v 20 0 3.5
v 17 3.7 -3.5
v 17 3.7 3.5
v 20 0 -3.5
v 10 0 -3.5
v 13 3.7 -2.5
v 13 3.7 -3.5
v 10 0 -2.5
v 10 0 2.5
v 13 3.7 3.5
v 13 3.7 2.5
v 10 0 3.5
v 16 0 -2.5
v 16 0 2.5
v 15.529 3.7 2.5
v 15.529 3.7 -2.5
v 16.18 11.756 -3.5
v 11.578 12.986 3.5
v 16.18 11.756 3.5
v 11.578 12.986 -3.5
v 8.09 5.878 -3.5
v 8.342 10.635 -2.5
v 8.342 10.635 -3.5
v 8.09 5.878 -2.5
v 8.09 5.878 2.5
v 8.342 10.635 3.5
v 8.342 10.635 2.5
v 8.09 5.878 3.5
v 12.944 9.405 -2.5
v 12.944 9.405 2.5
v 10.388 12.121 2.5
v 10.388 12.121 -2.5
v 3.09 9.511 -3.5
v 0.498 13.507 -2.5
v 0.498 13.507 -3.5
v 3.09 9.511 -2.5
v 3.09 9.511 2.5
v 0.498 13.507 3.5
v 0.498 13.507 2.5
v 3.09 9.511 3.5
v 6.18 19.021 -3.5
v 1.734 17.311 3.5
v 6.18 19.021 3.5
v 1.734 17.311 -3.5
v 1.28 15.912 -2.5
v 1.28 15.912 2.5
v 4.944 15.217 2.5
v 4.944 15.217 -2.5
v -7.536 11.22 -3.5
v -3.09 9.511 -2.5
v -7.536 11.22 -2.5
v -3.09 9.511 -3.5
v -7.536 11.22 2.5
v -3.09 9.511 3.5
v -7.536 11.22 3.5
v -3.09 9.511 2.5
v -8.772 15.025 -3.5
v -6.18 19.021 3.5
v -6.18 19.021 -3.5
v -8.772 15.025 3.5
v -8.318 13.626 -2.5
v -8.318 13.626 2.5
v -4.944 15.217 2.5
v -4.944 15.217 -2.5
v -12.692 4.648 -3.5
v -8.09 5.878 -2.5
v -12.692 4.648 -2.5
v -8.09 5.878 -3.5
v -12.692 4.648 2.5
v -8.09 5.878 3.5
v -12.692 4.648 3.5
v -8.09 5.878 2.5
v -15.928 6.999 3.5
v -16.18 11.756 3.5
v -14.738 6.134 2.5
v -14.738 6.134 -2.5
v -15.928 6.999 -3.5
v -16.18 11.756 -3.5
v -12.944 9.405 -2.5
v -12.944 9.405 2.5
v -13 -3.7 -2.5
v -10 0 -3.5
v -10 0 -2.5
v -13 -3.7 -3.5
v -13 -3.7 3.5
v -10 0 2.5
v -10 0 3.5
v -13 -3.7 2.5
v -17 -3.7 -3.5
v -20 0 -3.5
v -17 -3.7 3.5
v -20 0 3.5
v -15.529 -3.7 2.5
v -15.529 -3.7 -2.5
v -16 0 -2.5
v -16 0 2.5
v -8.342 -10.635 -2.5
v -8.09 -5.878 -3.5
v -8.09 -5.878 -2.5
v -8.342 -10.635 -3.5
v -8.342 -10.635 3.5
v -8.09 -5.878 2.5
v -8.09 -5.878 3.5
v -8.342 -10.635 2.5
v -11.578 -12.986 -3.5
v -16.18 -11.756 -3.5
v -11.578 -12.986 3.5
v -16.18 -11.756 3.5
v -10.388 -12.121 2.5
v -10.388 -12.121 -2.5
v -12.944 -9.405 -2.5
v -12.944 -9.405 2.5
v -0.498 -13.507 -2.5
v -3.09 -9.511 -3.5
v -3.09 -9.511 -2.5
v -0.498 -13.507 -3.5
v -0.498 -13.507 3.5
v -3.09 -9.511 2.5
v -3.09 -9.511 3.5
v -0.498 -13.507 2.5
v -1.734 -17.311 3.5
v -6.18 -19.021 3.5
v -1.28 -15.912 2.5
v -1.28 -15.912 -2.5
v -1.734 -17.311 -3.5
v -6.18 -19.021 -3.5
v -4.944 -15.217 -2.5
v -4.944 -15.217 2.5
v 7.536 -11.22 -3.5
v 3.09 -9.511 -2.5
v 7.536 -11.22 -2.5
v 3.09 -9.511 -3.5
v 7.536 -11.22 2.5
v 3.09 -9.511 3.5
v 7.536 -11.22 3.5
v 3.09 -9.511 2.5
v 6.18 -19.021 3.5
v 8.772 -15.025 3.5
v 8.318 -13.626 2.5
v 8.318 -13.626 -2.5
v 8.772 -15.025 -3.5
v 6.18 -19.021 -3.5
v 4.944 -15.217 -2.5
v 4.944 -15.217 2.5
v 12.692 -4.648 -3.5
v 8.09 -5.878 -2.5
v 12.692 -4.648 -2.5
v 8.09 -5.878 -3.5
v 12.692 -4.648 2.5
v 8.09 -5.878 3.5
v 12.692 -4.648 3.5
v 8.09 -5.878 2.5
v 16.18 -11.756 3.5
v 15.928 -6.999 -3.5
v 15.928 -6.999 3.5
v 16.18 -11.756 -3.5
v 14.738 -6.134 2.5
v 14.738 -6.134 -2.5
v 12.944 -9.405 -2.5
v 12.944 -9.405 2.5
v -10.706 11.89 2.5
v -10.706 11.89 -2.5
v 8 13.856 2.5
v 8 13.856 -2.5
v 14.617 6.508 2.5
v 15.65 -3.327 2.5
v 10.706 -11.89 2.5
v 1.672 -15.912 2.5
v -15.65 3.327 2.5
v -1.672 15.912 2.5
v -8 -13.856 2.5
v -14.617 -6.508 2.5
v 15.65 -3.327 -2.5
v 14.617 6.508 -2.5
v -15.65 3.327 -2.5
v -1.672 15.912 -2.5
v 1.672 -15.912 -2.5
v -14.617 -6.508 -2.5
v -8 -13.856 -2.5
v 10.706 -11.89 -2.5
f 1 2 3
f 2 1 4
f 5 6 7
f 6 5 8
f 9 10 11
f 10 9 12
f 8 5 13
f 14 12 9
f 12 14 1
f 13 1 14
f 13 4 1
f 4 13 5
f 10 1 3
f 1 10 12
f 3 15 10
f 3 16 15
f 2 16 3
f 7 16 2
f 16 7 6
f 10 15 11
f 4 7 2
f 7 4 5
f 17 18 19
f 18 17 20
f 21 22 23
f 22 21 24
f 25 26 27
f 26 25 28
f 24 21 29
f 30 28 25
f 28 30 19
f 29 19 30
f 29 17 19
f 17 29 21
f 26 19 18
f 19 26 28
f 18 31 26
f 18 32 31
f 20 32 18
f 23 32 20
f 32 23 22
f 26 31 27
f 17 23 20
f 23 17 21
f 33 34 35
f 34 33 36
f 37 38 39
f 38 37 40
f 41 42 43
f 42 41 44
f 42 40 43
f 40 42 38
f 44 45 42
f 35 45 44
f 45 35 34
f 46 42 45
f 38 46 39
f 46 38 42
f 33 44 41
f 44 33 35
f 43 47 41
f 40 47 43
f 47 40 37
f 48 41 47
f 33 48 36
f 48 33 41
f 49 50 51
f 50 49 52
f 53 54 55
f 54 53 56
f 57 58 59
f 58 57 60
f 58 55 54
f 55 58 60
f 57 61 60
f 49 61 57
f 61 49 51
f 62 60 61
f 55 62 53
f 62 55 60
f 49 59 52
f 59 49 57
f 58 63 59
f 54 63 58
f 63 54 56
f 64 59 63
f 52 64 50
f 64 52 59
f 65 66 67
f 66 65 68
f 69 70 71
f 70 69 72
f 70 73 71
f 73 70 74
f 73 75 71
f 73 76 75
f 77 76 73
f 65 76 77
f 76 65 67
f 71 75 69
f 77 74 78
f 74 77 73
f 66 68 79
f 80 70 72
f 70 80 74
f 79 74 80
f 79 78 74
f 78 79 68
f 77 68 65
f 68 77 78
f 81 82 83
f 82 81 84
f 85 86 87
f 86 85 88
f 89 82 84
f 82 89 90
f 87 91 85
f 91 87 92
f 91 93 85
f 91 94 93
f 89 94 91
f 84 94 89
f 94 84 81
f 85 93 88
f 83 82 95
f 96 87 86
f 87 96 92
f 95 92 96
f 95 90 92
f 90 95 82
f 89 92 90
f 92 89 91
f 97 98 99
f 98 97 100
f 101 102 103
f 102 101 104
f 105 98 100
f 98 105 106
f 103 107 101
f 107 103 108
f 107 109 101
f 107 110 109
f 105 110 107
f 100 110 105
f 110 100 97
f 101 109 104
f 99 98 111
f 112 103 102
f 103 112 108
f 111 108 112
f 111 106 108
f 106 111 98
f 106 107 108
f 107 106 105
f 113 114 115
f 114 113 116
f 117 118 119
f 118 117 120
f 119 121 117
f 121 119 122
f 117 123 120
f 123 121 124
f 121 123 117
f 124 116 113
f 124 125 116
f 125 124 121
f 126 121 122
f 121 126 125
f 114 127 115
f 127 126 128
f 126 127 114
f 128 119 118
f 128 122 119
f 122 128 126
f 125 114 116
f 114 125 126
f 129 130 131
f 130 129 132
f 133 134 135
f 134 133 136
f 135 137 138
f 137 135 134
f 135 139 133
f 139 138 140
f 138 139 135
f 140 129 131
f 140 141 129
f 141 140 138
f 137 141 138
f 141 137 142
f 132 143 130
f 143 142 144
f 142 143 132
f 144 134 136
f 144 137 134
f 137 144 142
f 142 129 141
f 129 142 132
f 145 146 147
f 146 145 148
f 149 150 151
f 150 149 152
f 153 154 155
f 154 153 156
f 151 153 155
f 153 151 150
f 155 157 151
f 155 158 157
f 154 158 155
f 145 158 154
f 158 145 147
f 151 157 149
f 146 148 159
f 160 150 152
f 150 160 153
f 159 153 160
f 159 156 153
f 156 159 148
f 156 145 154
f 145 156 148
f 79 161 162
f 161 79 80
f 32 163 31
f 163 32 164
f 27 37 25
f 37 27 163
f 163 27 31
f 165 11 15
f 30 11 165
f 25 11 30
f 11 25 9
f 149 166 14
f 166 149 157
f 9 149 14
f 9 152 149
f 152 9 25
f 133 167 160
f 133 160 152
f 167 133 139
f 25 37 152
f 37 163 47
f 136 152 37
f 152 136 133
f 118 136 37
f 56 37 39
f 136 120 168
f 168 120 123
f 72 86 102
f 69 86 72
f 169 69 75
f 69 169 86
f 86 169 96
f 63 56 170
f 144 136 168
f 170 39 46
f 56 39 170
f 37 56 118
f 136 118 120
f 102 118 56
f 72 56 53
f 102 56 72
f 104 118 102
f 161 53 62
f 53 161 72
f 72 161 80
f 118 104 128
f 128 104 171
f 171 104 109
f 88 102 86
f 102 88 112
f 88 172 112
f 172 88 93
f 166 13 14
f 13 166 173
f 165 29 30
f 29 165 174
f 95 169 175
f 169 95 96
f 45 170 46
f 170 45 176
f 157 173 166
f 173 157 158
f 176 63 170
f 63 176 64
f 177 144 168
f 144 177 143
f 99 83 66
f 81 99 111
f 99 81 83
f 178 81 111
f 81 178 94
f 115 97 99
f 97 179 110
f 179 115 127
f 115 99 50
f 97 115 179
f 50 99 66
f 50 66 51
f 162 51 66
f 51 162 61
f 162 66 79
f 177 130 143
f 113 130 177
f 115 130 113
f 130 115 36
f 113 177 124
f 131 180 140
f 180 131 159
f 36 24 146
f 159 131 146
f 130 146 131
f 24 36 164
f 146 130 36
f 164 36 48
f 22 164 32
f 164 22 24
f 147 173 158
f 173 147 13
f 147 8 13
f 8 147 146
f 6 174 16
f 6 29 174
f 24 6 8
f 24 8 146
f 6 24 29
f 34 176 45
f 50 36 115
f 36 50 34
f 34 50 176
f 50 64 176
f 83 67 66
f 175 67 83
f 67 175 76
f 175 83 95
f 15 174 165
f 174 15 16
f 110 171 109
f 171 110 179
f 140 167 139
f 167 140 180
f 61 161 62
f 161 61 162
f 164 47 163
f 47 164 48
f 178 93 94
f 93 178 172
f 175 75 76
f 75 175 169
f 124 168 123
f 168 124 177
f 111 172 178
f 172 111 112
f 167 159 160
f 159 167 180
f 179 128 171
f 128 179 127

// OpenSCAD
module Circular_Blade(){

    union(){   
        color("#a8b0b2")
        cylinder(5,16,16,$fn=30,center= true);

        for (i=[0:45:359]) {
            r = 15; // pattern radius
            n = 10; // number of Blade
            step = 360/n;
        for (i=[0:step:359]) {
            angle = i;
            dx = r*cos(angle);
            dy = r*sin(angle);
            translate([dx,dy,0])
            rotate([0,0,angle])
             
            color("#99a3a3")    
            linear_extrude(7, scale = 1, center = true)
            polygon(points=[[0,0],[5,0],[2,3.7],[-2,3.7],[-5,0]]);
             }
        }
    }
}

Circular_Blade();

// Written by Nicolì Angelo (Gengio) 2024: 
// MIT License

//Permission is hereby granted, free of charge, to any person obtaining a copy of this software and associated documentation files (the "Software"), to deal in the Software without restriction, including without limitation the rights to use, copy, modify, merge, publish, distribute, sublicense, and/or sell copies of the Software, and to permit persons to whom the Software is furnished to do so, subject to the following conditions:

//The above copyright notice and this permission notice shall be included in all copies or substantial portions of the Software.

//THE SOFTWARE IS PROVIDED "AS IS", WITHOUT WARRANTY OF ANY KIND, EXPRESS OR IMPLIED, INCLUDING BUT NOT LIMITED TO THE WARRANTIES OF MERCHANTABILITY, FITNESS FOR A PARTICULAR PURPOSE AND NONINFRINGEMENT. IN NO EVENT SHALL THE AUTHORS OR COPYRIGHT HOLDERS BE LIABLE FOR ANY CLAIM, DAMAGES OR OTHER LIABILITY, WHETHER IN AN ACTION OF CONTRACT, TORT OR OTHERWISE, ARISING FROM, OUT OF OR IN CONNECTION WITH THE SOFTWARE OR THE USE OR OTHER DEALINGS IN THE SOFTWARE.
